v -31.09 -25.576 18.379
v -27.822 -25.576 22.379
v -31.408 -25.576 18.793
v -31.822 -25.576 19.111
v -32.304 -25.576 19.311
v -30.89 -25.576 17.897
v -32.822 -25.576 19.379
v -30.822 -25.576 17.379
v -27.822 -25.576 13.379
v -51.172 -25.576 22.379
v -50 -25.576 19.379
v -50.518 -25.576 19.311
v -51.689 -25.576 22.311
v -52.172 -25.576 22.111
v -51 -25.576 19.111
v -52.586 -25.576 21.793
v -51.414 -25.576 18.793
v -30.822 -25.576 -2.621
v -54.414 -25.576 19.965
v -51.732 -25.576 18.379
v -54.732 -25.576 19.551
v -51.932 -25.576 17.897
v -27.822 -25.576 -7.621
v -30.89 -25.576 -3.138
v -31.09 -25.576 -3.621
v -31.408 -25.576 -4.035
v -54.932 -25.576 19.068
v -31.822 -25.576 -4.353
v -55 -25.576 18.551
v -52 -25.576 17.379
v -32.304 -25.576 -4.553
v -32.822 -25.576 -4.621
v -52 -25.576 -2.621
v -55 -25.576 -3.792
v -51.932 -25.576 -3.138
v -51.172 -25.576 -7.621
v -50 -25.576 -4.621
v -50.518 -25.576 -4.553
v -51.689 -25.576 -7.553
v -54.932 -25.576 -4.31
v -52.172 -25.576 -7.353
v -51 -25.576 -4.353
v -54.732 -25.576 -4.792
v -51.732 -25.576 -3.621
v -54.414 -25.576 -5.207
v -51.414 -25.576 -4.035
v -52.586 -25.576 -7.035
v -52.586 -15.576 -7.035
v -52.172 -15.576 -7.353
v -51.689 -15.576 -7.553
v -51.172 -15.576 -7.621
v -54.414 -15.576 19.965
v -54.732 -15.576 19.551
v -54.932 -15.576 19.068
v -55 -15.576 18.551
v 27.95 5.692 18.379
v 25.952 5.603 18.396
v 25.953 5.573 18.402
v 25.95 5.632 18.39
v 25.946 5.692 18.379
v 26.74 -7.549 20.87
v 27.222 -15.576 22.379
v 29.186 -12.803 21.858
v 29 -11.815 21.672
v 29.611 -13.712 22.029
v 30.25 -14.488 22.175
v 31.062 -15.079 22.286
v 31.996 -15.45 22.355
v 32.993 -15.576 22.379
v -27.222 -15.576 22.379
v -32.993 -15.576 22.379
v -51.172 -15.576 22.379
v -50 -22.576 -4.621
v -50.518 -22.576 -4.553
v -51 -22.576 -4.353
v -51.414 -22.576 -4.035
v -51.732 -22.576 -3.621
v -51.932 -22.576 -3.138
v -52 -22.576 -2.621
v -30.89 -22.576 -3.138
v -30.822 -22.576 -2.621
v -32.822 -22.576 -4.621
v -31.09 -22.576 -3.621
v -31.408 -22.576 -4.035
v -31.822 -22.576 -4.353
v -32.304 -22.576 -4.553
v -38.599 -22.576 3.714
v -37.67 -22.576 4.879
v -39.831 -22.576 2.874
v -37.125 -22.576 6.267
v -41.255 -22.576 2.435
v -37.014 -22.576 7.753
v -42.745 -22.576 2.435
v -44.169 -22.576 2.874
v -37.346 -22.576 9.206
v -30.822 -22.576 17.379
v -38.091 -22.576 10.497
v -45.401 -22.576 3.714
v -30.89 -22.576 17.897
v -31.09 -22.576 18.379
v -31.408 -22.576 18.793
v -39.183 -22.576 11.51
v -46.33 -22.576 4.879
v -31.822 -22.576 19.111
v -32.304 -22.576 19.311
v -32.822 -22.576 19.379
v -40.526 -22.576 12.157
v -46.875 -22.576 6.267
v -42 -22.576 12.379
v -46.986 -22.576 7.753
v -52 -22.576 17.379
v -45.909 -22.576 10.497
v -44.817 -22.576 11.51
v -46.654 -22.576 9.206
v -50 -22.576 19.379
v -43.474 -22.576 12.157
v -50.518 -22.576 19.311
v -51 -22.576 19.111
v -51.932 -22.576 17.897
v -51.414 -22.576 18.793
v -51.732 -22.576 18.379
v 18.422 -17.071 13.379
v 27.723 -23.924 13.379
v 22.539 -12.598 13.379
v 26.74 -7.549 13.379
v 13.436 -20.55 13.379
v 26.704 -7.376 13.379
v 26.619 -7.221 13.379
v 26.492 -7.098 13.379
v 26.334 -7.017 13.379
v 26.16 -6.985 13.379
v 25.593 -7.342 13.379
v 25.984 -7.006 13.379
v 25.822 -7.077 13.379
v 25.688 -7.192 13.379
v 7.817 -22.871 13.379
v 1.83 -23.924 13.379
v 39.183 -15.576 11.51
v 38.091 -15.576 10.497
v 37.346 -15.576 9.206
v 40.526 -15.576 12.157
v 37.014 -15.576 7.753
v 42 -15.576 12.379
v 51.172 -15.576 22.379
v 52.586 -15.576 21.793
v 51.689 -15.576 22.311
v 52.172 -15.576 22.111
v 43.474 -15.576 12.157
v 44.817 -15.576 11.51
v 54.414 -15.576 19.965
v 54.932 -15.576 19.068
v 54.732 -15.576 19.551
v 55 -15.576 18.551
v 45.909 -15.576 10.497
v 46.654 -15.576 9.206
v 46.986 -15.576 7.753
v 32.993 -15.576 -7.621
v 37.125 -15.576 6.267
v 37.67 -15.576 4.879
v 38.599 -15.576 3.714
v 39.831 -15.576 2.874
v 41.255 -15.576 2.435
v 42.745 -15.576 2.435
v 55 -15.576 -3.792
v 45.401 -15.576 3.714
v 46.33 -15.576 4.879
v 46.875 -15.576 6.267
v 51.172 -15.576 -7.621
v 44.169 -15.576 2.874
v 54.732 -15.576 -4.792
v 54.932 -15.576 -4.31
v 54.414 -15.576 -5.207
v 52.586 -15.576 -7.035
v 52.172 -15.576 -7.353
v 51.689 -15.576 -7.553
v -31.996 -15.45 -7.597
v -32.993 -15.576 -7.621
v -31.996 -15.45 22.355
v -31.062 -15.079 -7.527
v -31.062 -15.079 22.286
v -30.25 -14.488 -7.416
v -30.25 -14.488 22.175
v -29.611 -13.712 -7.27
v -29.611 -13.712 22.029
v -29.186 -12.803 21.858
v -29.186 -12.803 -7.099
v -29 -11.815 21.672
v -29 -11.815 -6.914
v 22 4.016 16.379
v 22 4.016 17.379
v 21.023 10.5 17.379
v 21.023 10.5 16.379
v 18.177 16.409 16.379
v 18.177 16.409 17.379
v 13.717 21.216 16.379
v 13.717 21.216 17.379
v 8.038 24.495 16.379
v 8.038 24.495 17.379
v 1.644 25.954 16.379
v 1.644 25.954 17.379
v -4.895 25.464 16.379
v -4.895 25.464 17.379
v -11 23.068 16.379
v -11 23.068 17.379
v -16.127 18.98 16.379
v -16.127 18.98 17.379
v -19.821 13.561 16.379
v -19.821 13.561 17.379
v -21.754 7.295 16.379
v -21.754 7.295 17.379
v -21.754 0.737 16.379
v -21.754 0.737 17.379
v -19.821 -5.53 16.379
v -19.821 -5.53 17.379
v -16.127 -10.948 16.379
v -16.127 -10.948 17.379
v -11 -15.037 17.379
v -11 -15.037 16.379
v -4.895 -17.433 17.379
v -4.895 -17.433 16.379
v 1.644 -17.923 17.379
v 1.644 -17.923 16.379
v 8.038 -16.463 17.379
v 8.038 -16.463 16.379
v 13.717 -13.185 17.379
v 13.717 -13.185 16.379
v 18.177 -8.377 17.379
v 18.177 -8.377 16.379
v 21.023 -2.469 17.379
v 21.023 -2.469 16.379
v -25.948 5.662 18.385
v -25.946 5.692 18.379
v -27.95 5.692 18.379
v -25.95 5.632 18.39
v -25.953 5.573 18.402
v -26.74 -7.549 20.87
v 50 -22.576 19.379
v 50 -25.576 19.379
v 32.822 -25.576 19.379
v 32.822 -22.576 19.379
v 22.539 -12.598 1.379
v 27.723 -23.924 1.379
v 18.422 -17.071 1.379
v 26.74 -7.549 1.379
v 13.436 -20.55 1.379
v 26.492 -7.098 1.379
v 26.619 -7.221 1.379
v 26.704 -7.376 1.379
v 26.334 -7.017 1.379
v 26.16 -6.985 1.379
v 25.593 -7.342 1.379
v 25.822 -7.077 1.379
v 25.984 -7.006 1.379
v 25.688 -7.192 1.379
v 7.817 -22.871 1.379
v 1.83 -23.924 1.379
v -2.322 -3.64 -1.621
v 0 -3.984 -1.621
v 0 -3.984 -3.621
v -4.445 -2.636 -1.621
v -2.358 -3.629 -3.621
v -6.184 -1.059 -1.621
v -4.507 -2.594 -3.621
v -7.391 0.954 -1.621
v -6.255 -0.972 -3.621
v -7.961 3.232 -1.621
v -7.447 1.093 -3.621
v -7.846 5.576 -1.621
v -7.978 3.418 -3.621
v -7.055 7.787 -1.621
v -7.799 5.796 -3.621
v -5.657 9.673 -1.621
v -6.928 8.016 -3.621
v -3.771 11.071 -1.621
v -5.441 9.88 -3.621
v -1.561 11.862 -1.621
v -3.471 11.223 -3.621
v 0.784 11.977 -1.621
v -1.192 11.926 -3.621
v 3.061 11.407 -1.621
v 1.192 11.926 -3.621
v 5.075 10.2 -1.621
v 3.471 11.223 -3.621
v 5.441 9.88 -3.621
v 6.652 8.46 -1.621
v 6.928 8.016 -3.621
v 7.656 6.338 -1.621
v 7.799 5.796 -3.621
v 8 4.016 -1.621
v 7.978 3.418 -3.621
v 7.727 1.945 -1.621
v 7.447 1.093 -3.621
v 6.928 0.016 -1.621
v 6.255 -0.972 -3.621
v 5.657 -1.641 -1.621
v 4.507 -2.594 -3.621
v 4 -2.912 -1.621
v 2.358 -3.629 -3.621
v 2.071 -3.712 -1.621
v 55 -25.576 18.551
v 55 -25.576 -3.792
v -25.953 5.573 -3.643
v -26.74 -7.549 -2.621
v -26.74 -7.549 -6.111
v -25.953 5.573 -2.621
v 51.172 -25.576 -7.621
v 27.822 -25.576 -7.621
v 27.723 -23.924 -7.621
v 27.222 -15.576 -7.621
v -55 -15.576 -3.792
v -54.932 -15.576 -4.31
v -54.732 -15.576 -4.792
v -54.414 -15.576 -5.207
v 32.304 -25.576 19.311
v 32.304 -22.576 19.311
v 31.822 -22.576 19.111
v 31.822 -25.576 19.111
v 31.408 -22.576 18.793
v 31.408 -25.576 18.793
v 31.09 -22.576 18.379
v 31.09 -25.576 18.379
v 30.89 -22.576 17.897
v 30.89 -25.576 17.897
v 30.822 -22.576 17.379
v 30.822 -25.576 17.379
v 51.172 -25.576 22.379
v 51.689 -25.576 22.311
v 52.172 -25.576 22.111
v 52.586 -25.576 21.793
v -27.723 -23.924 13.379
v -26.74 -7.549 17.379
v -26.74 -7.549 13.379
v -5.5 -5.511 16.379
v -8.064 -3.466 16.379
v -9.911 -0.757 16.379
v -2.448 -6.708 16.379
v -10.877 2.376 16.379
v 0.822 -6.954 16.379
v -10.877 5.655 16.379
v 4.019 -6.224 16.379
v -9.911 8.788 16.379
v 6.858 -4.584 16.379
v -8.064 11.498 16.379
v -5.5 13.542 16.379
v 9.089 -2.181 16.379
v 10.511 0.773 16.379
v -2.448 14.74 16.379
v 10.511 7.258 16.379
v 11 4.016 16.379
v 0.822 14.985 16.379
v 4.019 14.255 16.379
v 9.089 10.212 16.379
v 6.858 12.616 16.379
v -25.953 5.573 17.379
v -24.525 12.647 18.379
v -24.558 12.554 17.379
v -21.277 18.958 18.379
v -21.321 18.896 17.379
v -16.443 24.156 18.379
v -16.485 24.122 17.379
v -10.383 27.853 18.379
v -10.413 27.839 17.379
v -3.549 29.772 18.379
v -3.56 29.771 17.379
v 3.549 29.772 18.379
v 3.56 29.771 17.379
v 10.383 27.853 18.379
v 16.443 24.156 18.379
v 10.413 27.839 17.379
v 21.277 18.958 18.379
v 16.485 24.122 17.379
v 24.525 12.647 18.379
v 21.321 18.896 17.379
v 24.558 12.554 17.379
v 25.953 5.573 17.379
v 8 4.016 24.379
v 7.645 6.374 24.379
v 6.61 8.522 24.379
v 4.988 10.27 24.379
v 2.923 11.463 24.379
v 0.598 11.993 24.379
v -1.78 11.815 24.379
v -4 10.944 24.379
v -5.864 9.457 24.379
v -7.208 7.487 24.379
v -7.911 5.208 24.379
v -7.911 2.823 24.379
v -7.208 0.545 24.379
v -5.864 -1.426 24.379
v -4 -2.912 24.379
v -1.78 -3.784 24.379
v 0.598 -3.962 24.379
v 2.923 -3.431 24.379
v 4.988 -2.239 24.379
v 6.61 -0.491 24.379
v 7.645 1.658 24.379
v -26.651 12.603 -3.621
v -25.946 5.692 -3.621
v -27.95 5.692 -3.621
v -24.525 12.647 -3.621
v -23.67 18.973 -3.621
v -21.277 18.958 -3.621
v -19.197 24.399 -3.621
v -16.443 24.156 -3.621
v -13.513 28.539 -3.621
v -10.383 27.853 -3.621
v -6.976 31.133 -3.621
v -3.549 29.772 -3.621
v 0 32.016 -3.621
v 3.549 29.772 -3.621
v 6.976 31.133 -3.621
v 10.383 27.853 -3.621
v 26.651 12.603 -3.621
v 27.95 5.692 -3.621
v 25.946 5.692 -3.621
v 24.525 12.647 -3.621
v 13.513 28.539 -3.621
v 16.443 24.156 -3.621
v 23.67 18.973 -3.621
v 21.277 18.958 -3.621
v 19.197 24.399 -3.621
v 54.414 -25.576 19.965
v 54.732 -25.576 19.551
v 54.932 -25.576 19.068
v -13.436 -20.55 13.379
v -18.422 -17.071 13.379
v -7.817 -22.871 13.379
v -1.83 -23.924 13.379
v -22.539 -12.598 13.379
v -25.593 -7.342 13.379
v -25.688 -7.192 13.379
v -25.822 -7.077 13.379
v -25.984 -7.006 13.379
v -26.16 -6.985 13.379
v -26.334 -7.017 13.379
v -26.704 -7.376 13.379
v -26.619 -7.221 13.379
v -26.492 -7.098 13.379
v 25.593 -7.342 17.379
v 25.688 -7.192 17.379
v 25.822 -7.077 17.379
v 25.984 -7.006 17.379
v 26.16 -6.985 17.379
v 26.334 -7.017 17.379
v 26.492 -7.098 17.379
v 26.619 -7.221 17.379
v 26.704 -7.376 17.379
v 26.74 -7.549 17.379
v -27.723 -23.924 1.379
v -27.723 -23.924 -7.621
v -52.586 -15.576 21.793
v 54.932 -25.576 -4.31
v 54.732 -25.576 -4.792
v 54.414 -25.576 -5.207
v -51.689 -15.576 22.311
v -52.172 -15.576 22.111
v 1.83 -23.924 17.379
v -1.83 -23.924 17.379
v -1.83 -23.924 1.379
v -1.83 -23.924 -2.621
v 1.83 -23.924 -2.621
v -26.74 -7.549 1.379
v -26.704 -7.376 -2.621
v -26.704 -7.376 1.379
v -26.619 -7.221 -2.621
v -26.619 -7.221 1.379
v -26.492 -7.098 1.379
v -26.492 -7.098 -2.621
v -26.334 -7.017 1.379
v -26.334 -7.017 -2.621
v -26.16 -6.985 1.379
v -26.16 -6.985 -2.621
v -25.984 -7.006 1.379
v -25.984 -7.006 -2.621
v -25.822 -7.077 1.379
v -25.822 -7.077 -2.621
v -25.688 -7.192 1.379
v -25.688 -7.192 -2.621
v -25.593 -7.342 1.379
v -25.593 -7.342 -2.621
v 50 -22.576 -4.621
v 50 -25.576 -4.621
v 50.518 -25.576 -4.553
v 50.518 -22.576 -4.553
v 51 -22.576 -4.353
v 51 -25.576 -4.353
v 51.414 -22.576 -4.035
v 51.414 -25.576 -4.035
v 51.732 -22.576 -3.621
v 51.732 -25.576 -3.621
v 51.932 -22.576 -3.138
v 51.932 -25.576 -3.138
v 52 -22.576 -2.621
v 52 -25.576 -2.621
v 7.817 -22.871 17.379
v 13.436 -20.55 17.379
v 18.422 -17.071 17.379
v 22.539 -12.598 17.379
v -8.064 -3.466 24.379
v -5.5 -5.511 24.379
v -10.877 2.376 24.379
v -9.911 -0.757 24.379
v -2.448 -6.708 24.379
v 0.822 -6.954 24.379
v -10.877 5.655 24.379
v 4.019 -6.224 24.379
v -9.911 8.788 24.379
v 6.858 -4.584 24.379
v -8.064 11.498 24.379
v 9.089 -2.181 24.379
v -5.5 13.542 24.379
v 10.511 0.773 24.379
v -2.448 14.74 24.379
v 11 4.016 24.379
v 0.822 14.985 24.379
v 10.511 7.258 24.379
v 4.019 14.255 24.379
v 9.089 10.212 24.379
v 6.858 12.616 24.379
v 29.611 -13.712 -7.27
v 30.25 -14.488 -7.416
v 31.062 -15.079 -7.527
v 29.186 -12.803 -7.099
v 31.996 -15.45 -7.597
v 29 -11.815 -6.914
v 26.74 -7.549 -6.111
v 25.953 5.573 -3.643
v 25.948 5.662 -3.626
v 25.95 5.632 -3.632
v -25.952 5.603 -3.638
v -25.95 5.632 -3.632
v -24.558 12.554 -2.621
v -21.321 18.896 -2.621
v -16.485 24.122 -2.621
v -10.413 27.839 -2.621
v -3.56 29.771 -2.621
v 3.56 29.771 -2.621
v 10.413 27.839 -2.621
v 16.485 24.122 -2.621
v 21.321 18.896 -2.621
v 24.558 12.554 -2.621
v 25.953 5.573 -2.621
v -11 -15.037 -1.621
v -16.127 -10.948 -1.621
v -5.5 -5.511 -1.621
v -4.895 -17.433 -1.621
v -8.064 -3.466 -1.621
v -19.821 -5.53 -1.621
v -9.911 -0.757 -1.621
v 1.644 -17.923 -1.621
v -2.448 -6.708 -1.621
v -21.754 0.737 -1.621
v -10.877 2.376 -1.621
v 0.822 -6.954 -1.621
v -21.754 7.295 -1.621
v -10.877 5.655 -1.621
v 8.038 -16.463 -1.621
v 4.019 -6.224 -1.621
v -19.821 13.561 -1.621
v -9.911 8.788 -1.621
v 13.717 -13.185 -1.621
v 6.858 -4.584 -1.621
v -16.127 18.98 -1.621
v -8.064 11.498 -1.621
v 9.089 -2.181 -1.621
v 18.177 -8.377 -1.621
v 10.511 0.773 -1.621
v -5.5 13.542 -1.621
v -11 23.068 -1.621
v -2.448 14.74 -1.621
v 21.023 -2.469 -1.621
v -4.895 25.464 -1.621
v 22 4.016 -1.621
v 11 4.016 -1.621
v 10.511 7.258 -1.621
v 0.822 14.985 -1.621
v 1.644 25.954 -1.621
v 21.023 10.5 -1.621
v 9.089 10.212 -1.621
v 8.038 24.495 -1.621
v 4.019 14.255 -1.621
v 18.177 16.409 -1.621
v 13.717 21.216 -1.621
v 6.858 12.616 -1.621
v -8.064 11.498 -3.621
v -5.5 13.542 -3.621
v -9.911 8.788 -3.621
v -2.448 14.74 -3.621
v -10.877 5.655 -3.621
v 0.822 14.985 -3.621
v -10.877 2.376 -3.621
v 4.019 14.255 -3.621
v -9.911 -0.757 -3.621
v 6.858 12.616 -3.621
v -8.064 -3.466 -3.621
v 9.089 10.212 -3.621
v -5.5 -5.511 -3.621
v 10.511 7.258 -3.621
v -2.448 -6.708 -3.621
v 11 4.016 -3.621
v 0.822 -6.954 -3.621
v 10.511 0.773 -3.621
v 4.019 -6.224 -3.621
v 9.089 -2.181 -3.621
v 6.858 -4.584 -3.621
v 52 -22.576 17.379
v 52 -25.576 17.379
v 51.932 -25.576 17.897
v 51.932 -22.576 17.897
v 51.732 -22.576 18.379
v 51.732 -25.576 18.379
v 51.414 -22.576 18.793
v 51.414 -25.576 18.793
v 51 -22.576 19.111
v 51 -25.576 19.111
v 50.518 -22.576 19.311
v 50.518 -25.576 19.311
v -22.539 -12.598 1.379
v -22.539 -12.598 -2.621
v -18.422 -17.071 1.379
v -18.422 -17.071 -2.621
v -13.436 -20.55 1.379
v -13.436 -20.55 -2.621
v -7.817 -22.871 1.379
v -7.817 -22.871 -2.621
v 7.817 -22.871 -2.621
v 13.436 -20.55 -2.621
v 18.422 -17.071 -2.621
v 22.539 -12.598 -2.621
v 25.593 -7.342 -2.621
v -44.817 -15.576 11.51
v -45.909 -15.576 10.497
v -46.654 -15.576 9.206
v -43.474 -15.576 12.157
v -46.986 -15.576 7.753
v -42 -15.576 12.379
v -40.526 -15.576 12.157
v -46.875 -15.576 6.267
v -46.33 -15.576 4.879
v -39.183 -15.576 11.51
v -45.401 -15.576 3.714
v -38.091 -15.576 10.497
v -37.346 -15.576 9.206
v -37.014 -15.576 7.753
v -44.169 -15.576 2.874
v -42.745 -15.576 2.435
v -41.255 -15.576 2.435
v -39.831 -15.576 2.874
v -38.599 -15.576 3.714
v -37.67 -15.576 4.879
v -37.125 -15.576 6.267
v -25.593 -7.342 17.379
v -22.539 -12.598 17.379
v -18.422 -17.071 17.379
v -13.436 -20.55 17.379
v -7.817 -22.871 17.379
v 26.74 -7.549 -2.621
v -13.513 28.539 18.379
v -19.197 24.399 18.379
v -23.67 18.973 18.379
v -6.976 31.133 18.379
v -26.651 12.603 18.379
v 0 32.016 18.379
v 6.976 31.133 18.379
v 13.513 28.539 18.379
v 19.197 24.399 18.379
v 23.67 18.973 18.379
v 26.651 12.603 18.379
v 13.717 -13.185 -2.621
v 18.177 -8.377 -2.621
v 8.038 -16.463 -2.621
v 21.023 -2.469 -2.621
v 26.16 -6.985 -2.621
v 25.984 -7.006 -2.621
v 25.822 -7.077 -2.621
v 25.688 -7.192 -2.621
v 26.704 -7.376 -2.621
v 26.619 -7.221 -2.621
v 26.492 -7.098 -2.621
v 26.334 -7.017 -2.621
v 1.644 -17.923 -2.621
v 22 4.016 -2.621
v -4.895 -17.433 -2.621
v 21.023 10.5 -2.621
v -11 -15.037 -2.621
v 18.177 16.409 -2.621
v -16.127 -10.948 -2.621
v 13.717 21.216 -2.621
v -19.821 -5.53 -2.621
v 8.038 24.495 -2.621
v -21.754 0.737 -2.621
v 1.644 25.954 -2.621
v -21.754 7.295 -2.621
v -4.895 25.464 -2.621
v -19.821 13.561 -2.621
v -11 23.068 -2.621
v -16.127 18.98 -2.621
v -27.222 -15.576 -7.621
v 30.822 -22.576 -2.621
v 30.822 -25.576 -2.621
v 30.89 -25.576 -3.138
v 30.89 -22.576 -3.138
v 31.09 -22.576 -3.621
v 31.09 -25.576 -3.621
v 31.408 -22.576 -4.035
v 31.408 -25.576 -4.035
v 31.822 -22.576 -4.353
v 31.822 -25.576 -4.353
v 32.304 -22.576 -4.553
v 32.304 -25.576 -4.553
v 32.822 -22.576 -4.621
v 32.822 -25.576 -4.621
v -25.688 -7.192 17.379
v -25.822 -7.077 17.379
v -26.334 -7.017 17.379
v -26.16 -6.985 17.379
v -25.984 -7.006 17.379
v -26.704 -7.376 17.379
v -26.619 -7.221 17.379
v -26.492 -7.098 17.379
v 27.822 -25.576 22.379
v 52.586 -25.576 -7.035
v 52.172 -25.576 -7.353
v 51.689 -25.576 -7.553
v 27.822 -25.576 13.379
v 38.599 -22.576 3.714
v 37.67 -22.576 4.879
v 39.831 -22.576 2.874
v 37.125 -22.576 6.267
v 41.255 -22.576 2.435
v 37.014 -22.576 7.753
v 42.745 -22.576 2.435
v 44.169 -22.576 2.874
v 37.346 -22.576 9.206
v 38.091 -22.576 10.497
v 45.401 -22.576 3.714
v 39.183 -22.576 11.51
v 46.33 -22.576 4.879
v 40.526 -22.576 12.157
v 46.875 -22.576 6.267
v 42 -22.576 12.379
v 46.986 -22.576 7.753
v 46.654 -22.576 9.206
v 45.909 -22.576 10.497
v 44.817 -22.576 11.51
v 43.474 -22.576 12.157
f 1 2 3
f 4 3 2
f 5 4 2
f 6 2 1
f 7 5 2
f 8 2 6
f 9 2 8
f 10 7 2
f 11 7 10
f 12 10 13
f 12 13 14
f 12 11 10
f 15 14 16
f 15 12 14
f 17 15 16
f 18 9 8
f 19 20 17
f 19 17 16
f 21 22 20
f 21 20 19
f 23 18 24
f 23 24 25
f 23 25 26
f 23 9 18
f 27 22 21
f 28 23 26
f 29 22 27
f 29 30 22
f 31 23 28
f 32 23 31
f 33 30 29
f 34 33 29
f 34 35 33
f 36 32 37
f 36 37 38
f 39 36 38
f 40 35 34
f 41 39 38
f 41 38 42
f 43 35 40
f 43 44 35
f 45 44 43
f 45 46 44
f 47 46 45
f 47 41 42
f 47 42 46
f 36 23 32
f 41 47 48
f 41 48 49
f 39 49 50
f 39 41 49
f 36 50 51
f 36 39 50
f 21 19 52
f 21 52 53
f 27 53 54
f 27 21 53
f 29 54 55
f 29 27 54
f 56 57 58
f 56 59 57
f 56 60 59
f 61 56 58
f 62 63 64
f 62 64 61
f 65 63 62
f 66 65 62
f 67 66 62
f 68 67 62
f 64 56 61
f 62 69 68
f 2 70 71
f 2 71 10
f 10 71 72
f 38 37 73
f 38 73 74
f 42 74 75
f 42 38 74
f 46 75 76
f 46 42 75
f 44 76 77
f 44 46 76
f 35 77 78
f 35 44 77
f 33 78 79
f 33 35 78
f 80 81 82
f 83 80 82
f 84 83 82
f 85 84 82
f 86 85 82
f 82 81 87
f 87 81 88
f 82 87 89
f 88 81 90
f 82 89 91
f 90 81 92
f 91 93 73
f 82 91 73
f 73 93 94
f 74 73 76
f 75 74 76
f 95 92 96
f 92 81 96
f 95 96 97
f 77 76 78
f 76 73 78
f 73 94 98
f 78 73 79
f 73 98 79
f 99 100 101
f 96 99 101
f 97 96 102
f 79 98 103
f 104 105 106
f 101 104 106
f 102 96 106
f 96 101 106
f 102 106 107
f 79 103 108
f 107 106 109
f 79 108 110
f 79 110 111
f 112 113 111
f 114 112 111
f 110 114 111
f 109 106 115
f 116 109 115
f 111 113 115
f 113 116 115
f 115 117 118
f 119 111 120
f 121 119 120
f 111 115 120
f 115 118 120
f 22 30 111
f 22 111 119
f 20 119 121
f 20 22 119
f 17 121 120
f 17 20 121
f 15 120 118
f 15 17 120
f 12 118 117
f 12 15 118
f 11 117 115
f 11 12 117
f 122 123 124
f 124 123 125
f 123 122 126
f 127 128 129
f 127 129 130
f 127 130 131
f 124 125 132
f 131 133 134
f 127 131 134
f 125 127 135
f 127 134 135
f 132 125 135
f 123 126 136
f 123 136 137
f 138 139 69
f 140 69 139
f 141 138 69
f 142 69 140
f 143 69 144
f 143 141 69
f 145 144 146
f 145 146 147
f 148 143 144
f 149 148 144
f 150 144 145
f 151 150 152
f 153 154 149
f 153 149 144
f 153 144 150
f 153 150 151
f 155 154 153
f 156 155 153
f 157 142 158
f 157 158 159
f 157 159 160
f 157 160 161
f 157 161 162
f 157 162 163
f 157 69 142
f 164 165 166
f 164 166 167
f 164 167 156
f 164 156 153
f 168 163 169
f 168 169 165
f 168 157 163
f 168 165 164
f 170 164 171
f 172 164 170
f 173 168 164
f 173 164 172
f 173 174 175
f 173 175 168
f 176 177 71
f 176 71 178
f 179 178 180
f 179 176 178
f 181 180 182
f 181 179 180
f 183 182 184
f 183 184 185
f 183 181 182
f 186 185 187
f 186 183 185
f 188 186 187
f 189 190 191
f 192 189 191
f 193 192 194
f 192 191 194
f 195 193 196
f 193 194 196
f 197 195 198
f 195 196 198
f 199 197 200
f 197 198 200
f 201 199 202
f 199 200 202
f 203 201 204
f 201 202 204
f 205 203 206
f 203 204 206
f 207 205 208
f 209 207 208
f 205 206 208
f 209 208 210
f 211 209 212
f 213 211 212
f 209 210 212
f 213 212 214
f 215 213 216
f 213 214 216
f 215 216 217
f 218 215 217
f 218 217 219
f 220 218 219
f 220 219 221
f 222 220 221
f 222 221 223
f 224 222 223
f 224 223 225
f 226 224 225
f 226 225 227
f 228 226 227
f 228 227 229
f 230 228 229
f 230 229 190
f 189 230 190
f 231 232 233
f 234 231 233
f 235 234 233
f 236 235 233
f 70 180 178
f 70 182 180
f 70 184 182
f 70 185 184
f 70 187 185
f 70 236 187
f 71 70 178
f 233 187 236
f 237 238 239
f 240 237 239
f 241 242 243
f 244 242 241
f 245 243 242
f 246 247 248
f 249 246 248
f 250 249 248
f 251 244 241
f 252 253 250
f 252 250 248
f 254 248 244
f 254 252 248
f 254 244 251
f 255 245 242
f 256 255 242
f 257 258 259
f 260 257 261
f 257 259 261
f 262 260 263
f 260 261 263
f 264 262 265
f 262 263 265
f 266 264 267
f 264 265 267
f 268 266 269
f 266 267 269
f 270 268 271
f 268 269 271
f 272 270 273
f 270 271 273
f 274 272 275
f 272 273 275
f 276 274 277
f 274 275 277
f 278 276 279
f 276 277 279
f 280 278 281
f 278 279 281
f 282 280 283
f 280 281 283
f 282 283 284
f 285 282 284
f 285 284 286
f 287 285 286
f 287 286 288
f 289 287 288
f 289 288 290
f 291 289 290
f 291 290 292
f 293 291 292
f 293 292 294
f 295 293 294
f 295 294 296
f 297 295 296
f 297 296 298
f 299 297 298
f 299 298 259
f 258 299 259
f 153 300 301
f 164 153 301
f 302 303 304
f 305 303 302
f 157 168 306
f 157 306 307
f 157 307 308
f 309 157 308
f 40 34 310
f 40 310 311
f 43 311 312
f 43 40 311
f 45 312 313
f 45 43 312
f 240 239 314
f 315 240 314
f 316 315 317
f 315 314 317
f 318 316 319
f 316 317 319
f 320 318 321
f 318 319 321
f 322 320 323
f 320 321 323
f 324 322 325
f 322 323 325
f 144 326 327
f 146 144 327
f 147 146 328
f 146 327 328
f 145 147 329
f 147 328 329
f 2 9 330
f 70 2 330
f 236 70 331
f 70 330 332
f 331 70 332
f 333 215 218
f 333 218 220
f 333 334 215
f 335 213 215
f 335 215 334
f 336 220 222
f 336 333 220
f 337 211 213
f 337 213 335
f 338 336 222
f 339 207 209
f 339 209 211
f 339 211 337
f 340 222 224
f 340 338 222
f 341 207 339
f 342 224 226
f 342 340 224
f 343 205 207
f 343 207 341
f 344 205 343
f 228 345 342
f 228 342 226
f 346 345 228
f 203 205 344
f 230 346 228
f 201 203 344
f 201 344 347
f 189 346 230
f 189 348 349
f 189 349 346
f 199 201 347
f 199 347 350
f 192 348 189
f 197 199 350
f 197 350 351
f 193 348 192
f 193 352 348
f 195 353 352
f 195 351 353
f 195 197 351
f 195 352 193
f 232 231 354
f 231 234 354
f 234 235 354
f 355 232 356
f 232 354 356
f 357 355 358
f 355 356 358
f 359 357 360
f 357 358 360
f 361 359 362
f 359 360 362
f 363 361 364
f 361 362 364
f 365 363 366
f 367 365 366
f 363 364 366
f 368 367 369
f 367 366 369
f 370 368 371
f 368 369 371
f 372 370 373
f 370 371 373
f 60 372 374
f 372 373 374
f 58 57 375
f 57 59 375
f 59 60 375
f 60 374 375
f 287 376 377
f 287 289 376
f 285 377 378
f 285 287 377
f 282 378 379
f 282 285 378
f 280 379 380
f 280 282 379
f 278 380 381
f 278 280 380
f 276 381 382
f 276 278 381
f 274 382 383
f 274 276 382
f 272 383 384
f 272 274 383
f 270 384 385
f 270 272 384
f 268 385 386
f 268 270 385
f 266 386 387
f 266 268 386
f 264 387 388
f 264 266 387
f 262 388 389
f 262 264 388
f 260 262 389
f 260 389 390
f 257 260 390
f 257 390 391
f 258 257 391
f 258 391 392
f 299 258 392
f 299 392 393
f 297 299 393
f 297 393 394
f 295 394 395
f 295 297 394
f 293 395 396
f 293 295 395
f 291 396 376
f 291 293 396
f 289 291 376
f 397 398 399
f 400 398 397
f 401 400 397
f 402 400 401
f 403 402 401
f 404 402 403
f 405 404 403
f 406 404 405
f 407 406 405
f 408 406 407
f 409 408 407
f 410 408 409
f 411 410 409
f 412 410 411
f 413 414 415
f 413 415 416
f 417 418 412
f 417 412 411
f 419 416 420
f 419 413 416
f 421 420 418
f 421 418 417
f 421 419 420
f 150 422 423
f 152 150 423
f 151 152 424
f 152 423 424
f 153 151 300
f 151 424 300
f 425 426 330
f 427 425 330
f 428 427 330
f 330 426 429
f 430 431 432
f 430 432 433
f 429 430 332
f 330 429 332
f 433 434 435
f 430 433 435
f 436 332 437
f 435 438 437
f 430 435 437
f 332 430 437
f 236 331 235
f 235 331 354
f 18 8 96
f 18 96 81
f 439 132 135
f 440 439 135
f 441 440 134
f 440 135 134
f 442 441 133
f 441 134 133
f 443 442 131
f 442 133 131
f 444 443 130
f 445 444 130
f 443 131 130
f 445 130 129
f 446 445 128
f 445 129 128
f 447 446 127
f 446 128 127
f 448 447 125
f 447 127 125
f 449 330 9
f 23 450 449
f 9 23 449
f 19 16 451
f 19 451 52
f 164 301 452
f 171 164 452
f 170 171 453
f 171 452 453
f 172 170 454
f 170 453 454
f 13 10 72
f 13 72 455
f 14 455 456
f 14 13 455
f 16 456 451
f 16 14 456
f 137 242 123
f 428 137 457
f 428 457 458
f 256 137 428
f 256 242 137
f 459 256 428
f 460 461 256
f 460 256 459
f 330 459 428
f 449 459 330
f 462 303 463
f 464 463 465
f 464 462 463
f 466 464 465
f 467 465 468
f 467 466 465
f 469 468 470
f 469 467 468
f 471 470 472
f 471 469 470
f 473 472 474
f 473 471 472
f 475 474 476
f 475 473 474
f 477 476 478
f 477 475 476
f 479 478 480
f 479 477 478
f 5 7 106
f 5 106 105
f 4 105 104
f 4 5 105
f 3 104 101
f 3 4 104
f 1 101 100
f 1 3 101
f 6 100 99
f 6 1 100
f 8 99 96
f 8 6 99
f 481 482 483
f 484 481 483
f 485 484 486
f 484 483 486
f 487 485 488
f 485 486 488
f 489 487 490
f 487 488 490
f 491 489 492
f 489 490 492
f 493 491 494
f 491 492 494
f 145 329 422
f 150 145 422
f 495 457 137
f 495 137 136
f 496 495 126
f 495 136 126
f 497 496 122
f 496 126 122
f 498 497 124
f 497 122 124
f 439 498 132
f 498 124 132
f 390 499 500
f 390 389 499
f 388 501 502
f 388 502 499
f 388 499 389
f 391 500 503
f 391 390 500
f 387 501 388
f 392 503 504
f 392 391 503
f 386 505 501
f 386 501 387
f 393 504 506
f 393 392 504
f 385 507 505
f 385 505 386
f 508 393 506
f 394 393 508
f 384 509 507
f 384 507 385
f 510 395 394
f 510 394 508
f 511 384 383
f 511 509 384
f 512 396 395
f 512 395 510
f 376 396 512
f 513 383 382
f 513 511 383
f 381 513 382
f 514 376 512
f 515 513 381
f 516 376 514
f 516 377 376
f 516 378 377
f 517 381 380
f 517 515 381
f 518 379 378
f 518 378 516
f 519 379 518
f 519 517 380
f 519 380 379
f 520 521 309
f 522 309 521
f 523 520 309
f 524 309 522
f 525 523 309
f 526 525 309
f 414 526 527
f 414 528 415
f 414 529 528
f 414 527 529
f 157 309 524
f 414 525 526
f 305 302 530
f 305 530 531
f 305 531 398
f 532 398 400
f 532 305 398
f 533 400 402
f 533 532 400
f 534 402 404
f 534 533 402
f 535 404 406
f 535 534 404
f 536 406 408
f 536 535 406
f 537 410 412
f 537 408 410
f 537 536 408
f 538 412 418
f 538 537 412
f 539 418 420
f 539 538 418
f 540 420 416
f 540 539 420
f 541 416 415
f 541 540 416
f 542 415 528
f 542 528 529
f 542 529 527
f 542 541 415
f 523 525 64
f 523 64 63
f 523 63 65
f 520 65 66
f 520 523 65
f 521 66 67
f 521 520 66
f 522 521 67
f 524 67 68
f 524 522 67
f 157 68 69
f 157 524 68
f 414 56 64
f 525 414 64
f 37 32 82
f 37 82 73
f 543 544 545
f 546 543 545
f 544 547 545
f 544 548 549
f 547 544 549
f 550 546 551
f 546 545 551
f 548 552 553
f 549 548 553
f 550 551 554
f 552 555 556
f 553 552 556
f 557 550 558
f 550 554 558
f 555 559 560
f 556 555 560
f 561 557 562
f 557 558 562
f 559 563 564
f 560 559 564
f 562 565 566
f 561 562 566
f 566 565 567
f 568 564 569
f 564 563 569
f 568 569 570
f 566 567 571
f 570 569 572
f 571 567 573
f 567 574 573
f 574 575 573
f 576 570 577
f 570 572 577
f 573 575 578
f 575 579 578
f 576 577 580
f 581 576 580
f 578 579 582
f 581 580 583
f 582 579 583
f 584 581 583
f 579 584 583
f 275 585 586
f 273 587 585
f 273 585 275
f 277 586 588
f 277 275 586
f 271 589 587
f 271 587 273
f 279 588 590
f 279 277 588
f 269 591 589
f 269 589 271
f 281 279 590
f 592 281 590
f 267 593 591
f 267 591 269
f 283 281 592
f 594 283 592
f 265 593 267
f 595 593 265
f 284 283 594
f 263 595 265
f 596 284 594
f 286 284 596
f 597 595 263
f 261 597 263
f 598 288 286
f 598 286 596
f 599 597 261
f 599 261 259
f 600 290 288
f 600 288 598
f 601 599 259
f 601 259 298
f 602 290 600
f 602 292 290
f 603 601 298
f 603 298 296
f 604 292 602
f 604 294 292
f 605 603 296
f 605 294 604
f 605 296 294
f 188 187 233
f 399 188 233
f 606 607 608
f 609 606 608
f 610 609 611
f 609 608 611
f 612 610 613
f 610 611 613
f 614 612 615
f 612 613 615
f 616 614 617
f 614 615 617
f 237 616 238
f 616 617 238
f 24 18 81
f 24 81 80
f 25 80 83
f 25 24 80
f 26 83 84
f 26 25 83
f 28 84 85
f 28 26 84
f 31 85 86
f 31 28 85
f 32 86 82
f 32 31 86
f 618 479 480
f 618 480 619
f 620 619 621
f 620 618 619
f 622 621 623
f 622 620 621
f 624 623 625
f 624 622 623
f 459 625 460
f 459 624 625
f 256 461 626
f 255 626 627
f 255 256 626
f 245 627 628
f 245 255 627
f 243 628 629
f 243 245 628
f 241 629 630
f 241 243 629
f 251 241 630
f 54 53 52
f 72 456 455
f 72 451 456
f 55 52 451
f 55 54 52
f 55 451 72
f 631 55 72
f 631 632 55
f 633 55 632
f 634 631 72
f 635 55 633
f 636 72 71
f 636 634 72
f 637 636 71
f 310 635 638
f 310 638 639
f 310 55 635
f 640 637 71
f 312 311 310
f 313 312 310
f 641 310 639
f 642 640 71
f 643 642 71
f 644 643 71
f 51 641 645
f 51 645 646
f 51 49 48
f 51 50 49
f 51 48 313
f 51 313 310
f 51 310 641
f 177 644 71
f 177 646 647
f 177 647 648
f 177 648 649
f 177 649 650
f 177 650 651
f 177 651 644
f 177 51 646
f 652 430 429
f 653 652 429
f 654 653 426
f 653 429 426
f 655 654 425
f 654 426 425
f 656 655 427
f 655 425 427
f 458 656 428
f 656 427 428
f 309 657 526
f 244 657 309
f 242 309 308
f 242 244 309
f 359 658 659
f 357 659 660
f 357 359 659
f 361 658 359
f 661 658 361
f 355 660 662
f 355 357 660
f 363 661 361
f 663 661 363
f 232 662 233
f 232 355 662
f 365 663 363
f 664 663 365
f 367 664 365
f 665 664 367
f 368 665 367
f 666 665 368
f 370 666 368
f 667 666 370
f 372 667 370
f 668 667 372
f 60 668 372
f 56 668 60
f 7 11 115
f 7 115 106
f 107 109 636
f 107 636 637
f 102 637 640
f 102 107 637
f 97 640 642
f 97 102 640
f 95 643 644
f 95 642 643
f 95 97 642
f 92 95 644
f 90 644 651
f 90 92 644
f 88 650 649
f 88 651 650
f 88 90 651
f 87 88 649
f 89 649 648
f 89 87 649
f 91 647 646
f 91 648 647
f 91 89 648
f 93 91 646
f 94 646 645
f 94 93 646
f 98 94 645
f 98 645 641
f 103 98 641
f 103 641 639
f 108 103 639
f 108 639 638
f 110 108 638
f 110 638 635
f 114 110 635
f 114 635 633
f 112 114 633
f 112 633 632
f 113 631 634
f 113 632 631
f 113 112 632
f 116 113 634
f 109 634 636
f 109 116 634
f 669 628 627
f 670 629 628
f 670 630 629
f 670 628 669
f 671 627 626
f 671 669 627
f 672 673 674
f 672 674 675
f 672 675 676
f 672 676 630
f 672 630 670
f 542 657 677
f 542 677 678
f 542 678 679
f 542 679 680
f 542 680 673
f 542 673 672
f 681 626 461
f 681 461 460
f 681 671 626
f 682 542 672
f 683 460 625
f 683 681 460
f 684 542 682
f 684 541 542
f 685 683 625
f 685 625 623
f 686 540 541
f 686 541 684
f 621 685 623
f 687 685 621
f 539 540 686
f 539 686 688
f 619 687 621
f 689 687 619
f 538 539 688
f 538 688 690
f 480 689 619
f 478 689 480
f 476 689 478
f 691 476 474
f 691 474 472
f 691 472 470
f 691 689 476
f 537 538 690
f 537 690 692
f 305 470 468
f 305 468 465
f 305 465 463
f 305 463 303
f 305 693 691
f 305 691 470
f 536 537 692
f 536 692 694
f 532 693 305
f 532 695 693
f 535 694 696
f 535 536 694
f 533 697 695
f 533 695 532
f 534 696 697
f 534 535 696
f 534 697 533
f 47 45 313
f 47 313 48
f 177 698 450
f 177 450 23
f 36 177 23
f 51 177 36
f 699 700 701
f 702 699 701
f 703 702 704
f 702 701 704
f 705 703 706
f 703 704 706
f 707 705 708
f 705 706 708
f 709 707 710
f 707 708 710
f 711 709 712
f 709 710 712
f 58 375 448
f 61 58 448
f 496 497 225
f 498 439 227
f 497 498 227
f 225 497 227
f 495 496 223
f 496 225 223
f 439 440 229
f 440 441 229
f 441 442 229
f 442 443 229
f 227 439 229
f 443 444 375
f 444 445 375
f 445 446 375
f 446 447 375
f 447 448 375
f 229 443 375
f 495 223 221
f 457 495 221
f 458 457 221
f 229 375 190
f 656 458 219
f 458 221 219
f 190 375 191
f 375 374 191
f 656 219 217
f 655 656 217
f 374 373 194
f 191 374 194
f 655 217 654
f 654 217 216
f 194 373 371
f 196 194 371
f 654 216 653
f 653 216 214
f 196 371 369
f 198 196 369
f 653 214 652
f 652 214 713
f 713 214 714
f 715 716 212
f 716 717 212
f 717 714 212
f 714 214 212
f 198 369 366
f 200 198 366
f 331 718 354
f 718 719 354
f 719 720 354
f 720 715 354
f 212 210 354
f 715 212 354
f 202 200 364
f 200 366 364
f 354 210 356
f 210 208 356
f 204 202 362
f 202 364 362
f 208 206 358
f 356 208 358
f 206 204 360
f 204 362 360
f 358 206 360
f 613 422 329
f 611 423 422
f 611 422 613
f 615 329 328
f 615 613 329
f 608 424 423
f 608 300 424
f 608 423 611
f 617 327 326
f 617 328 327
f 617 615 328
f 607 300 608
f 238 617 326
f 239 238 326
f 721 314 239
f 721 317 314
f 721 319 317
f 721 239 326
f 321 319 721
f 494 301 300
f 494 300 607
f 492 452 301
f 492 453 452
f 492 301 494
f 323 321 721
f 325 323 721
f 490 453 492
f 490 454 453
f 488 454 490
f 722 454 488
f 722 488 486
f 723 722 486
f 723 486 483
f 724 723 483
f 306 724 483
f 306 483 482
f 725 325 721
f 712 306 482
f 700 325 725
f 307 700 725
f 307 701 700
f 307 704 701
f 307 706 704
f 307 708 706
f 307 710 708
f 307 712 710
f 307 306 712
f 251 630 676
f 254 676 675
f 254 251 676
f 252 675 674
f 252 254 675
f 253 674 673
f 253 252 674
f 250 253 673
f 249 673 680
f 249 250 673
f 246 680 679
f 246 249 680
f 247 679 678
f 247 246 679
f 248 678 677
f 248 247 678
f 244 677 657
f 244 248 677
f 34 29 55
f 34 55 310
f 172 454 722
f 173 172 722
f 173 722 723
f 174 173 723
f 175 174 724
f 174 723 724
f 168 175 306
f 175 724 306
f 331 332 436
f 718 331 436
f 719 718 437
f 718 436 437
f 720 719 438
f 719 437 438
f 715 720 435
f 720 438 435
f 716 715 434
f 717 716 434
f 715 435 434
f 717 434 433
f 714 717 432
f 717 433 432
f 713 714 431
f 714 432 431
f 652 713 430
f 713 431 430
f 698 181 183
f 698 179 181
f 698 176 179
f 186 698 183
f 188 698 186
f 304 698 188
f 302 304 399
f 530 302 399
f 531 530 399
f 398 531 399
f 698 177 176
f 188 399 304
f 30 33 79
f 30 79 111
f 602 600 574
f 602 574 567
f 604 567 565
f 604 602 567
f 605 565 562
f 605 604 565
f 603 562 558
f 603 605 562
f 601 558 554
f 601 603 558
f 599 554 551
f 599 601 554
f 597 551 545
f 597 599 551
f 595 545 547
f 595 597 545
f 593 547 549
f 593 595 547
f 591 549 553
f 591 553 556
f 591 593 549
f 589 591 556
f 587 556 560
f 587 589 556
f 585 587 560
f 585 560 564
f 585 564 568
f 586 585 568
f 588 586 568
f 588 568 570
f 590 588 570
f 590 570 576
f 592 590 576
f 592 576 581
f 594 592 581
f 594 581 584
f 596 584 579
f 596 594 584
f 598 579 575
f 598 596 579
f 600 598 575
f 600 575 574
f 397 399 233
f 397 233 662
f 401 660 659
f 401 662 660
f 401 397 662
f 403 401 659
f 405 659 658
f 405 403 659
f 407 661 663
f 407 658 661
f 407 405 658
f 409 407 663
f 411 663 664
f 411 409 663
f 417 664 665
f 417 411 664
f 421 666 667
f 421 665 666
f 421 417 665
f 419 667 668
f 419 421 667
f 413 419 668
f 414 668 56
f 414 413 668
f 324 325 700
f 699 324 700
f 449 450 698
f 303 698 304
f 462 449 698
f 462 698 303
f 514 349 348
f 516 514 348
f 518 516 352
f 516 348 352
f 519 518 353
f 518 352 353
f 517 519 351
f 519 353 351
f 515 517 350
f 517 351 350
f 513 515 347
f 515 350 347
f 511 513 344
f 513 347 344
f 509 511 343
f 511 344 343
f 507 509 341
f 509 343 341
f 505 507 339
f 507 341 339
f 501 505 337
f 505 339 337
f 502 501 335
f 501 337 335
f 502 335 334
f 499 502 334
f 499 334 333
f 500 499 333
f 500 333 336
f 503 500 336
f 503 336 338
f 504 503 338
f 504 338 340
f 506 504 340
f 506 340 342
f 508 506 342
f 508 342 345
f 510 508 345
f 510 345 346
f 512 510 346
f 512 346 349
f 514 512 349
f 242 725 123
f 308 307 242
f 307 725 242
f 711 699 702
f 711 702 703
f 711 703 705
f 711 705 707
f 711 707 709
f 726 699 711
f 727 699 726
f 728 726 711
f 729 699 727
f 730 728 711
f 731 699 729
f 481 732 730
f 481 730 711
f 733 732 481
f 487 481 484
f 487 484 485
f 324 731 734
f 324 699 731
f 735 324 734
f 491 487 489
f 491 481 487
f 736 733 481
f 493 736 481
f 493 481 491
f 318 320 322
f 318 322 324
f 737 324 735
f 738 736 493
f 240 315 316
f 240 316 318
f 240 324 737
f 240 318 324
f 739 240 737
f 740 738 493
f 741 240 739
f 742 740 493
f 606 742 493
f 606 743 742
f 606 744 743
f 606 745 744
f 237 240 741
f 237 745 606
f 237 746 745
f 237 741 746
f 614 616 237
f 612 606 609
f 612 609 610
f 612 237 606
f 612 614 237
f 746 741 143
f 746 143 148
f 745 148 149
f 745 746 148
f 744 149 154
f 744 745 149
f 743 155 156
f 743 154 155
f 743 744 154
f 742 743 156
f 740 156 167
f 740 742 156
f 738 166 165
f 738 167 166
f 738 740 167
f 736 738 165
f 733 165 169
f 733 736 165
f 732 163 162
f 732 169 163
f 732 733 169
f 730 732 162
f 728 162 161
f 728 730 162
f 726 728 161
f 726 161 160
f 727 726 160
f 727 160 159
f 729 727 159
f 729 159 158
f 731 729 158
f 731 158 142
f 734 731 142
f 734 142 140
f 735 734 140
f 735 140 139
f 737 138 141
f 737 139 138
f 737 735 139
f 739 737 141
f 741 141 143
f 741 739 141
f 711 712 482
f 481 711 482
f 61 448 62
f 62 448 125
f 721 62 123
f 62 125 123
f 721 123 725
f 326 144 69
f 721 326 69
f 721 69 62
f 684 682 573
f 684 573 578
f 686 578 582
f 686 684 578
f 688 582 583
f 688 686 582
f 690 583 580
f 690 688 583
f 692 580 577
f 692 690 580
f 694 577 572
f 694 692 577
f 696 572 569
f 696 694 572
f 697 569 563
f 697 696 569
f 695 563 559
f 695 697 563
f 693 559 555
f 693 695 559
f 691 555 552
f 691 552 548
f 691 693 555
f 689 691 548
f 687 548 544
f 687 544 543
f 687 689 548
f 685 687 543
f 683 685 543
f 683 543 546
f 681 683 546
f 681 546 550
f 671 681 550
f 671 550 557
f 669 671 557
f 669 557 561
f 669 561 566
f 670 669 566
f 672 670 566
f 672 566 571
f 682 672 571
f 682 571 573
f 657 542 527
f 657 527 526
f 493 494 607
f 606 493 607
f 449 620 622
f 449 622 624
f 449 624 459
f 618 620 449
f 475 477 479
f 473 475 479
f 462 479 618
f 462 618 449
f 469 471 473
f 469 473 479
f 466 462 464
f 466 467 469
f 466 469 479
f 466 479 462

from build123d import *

# Parameters (mm, degrees)
CROQUIS1_R                 = 4
SALIENTE_EXTRUIR1_DEPTH    = 15
CROQUIS2_R                 = 11
CORTAR_EXTRUIR1_DEPTH      = 3
CROQUIS3_R                 = 5.5
CROQUIS3_R_2               = 4
SALIENTE_EXTRUIR2_DEPTH    = 4
CORTAR_EXTRUIR2_DEPTH      = 36.134373023
CORTAR_EXTRUIR2_DEPTH_BACK = 36.134373023
CROQUIS4_R                 = 2.5
CORTAR_EXTRUIR3_START      = -4.5
CORTAR_EXTRUIR3_DEPTH      = 4.5
CORTAR_EXTRUIR4_START      = -2.5
CROQUIS8_R                 = 5.5
CORTAR_EXTRUIR4_DEPTH      = 2.5
CORTAR_EXTRUIR5_DEPTH      = 34.684924933
CORTAR_EXTRUIR5_DEPTH_BACK = 34.684924933
CORTAR_EXTRUIR6_REACH      = 61.188
CORTAR_EXTRUIR7_DEPTH      = 5
CORTAR_EXTRUIR8_DEPTH      = 1.5
SALIENTE_EXTRUIR3_START    = 1
CROQUIS13_R                = 5.5
CROQUIS13_R_2              = 4
SALIENTE_EXTRUIR3_DEPTH    = 1
SCALE1_SCALE               = 2


with BuildPart() as part:
    # Croquis1 → Saliente-Extruir1 (new body)
    with BuildSketch(Plane.XY):
        with BuildLine():
            Line((27.5, -13.890204062), (-27.5, -13.890204062))
            Line((-27.5, -13.890204062), (-27.5, -8.890204062))
            Line((-27.5, -8.890204062), (-16.496411132, -8.890204062))
            ThreePointArc((-16.496411132, -8.890204062), (-15.125192899, -8.346143813), (-14.5, -7.009964621))
            Line((-14.5, -7.009964621), (-13.974877925, 1.743831875))
            ThreePointArc((-13.974877925, 1.743831875), (0, 14.905507967), (13.974877925, 1.743831875))
            Line((13.974877925, 1.743831875), (14.5, -7.009964621))
            ThreePointArc((14.5, -7.009964621), (15.125192899, -8.346143813), (16.496411132, -8.890204062))
            Line((16.496411132, -8.890204062), (27.5, -8.890204062))
            Line((27.5, -8.890204062), (27.5, -13.890204062))
        make_face()
        with Locations((0, 0.905507967)):
            Circle(CROQUIS1_R, mode=Mode.SUBTRACT)
    extrude(amount=SALIENTE_EXTRUIR1_DEPTH)

    # Croquis2 → Cortar-Extruir1 (cut)
    with BuildSketch(Plane.XY.offset(15)):
        with Locations((0, 0.905507967)):
            Circle(CROQUIS2_R)
    cortar_extruir1 = extrude(amount=-CORTAR_EXTRUIR1_DEPTH, mode=Mode.SUBTRACT)

    # Croquis3 → Saliente-Extruir2 (add)
    with BuildSketch(Plane.XY.offset(12)):
        with Locations((0, 0.905507967)):
            Circle(CROQUIS3_R)
        with Locations((0, 0.905507967)):
            Circle(CROQUIS3_R_2, mode=Mode.SUBTRACT)
    extrude(amount=SALIENTE_EXTRUIR2_DEPTH)

    # Croquis4 → Cortar-Extruir2 (cut, two sides: drawn at the far end of the back side and taken through both)
    with BuildSketch(Plane(origin=(0, 0, 0), x_dir=(1, 0, 0), z_dir=(0, 1, 0)).offset(-CORTAR_EXTRUIR2_DEPTH_BACK)):
        with Locations(Location((-21, -7.5, 0), (0, 0, 270))):
            Circle(CROQUIS4_R)
        with Locations(Location((21, -7.5, 0), (0, 0, 270))):
            Circle(CROQUIS4_R)
    extrude(amount=CORTAR_EXTRUIR2_DEPTH + CORTAR_EXTRUIR2_DEPTH_BACK, mode=Mode.SUBTRACT)

    # Simetría1: Cortar-Extruir1 across plane
    add(cortar_extruir1.mirror(Plane.XY.offset(7.5)), mode=Mode.SUBTRACT)

    # Croquis7 → Cortar-Extruir3 (cut)
    with BuildSketch(Plane.XY.offset(15).offset(CORTAR_EXTRUIR3_START)):
        with BuildLine():
            Line((-13.910933618, -13.890204062), (-13.370245715, -4.876924871))
            ThreePointArc((-13.370245715, -4.876924871), (-13.124159844, -4.599675432), (-12.796571792, -4.773202306))
            ThreePointArc((-12.796571792, -4.773202306), (0, -13.094492033), (12.796571792, -4.773202306))
            ThreePointArc((12.796571792, -4.773202306), (13.124159844, -4.599675432), (13.370245715, -4.876924871))
            Line((13.370245715, -4.876924871), (13.910933618, -13.890204062))
            Line((13.910933618, -13.890204062), (-13.910933618, -13.890204062))
        make_face()
    cortar_extruir3 = extrude(amount=CORTAR_EXTRUIR3_DEPTH, mode=Mode.SUBTRACT)

    # Croquis8 → Cortar-Extruir4 (cut)
    with BuildSketch(Plane.XY.offset(15).offset(CORTAR_EXTRUIR4_START)):
        with BuildLine():
            Line((-13.910933618, -13.890204062), (-12.976672359, 1.683951596))
            ThreePointArc((-12.976672359, 1.683951596), (0, 13.905507967), (12.976672359, 1.683951596))
            Line((12.976672359, 1.683951596), (13.910933618, -13.890204062))
            Line((13.910933618, -13.890204062), (-13.910933618, -13.890204062))
        make_face()
        with Locations((0, 0.905507967)):
            Circle(CROQUIS8_R, mode=Mode.SUBTRACT)
    cortar_extruir4 = extrude(amount=CORTAR_EXTRUIR4_DEPTH, mode=Mode.SUBTRACT)

    # Croquis9 → Cortar-Extruir5 (cut, two sides: drawn at the far end of the back side and taken through both)
    with BuildSketch(Plane.XY.offset(12.5).offset(-CORTAR_EXTRUIR5_DEPTH_BACK)):
        Polygon((13.910933618, -13.890204062), (13.861404459, -13.064551894), (-13.861404459, -13.064551894), (-13.910933618, -13.890204062), align=None)
    extrude(amount=CORTAR_EXTRUIR5_DEPTH + CORTAR_EXTRUIR5_DEPTH_BACK, mode=Mode.SUBTRACT)

    # Croquis10 → Cortar-Extruir6 (cut, up to next)
    with BuildSketch(Plane(origin=(27.5, 0, 0), x_dir=(0, 0, -1), z_dir=(1, 0, 0)), mode=Mode.PRIVATE) as cortar_extruir6_sk1:
        Polygon((-15, 15.98971015), (-13, 14.905507967), (-13, 1.743831875), (-15, -8.890204062), align=None)
    cortar_extruir6_tool1 = extrude(cortar_extruir6_sk1.sketch, amount=-CORTAR_EXTRUIR6_REACH, mode=Mode.PRIVATE) & part.part
    # Croquis10 → Cortar-Extruir6 (cut, up to next)
    with BuildSketch(Plane(origin=(27.5, 0, 0), x_dir=(0, 0, -1), z_dir=(1, 0, 0)), mode=Mode.PRIVATE) as cortar_extruir6_sk2:
        Polygon((-2, 14.905507967), (0, 15.98971015), (0, -8.890204062), (-2, 1.743831875), align=None)
    cortar_extruir6_tool2 = extrude(cortar_extruir6_sk2.sketch, amount=-CORTAR_EXTRUIR6_REACH, mode=Mode.PRIVATE) & part.part
    add(cortar_extruir6_tool1.solids().sort_by_distance((27.5, 5.692069, 14.102679))[0], mode=Mode.SUBTRACT)
    add(cortar_extruir6_tool2.solids().sort_by_distance((27.5, 5.692069, 0.897321))[0], mode=Mode.SUBTRACT)

    # Croquis11 → Cortar-Extruir7 (cut)
    with BuildSketch(Plane.XZ.offset(13.890204062)):
        with BuildLine():
            Line((-26.292893219, 14.707106781), (-27.207106781, 13.792893219))
            ThreePointArc((-27.207106781, 13.792893219), (-27.423879533, 13.46846987), (-27.5, 13.085786438))
            Line((-27.5, 13.085786438), (-27.5, 1.914213562))
            ThreePointArc((-27.5, 1.914213562), (-27.423879533, 1.53153013), (-27.207106781, 1.207106781))
            Line((-27.207106781, 1.207106781), (-26.292893219, 0.292893219))
            ThreePointArc((-26.292893219, 0.292893219), (-25.96846987, 0.076120467), (-25.585786438, 0))
            Line((-25.585786438, 0), (-15.540514777, 0))
            Line((-15.540514777, 0), (-15.540514777, -5.530731653))
            Line((-15.540514777, -5.530731653), (-33.970258, -5.530731653))
            Line((-33.970258, -5.530731653), (-33.970258, 16.269467594))
            Line((-33.970258, 16.269467594), (-15.540514777, 16.269467594))
            Line((-15.540514777, 16.269467594), (-15.540514777, 15))
            Line((-15.540514777, 15), (-25.585786438, 15))
            ThreePointArc((-25.585786438, 15), (-25.96846987, 14.923879533), (-26.292893219, 14.707106781))
        make_face()
    cortar_extruir7 = extrude(amount=-CORTAR_EXTRUIR7_DEPTH, mode=Mode.SUBTRACT)

    # Croquis12 → Cortar-Extruir8 (cut)
    with BuildSketch(Plane.XZ.offset(13.890204062)):
        with BuildLine():
            Line((-25, 13.5), (-16.410933618, 13.5))
            ThreePointArc((-16.410933618, 13.5), (-15.703826837, 13.207106781), (-15.410933618, 12.5))
            Line((-15.410933618, 12.5), (-15.410933618, 2.5))
            ThreePointArc((-15.410933618, 2.5), (-15.703826837, 1.792893219), (-16.410933618, 1.5))
            Line((-16.410933618, 1.5), (-25, 1.5))
            ThreePointArc((-25, 1.5), (-25.707106781, 1.792893219), (-26, 2.5))
            Line((-26, 2.5), (-26, 12.5))
            ThreePointArc((-26, 12.5), (-25.707106781, 13.207106781), (-25, 13.5))
        make_face()
    cortar_extruir8 = extrude(amount=-CORTAR_EXTRUIR8_DEPTH, mode=Mode.SUBTRACT)

    # Simetría2: Cortar-Extruir7, Cortar-Extruir8 across plane
    add(cortar_extruir7.mirror(Plane(origin=(0, 0, 0), x_dir=(0, 0, 1), z_dir=(1, 0, 0))), mode=Mode.SUBTRACT)
    add(cortar_extruir8.mirror(Plane(origin=(0, 0, 0), x_dir=(0, 0, 1), z_dir=(1, 0, 0))), mode=Mode.SUBTRACT)

    # Simetría4: Cortar-Extruir3, Cortar-Extruir4 across plane
    add(cortar_extruir3.mirror(Plane.XY.offset(7.5)), mode=Mode.SUBTRACT)
    add(cortar_extruir4.mirror(Plane.XY.offset(7.5)), mode=Mode.SUBTRACT)

    # Croquis13 → Saliente-Extruir3 (add)
    with BuildSketch(Plane(origin=(0, 0, 3), x_dir=(-1, 0, 0), z_dir=(0, 0, -1)).offset(SALIENTE_EXTRUIR3_START)):
        with Locations(Location((0, 0.905507967, 0), (0, 0, 180))):
            Circle(CROQUIS13_R)
        with Locations(Location((0, 0.905507967, 0), (0, 0, 270))):
            Circle(CROQUIS13_R_2, mode=Mode.SUBTRACT)
    extrude(amount=-SALIENTE_EXTRUIR3_DEPTH)


with BuildPart() as part_1:
    # Scale1: scaled about (0, -2.204708481, 7.62083442)
    add(part.part.scale(SCALE1_SCALE).moved(Location((0, 2.204708481, -7.62083442))))


solid = part_1.part
